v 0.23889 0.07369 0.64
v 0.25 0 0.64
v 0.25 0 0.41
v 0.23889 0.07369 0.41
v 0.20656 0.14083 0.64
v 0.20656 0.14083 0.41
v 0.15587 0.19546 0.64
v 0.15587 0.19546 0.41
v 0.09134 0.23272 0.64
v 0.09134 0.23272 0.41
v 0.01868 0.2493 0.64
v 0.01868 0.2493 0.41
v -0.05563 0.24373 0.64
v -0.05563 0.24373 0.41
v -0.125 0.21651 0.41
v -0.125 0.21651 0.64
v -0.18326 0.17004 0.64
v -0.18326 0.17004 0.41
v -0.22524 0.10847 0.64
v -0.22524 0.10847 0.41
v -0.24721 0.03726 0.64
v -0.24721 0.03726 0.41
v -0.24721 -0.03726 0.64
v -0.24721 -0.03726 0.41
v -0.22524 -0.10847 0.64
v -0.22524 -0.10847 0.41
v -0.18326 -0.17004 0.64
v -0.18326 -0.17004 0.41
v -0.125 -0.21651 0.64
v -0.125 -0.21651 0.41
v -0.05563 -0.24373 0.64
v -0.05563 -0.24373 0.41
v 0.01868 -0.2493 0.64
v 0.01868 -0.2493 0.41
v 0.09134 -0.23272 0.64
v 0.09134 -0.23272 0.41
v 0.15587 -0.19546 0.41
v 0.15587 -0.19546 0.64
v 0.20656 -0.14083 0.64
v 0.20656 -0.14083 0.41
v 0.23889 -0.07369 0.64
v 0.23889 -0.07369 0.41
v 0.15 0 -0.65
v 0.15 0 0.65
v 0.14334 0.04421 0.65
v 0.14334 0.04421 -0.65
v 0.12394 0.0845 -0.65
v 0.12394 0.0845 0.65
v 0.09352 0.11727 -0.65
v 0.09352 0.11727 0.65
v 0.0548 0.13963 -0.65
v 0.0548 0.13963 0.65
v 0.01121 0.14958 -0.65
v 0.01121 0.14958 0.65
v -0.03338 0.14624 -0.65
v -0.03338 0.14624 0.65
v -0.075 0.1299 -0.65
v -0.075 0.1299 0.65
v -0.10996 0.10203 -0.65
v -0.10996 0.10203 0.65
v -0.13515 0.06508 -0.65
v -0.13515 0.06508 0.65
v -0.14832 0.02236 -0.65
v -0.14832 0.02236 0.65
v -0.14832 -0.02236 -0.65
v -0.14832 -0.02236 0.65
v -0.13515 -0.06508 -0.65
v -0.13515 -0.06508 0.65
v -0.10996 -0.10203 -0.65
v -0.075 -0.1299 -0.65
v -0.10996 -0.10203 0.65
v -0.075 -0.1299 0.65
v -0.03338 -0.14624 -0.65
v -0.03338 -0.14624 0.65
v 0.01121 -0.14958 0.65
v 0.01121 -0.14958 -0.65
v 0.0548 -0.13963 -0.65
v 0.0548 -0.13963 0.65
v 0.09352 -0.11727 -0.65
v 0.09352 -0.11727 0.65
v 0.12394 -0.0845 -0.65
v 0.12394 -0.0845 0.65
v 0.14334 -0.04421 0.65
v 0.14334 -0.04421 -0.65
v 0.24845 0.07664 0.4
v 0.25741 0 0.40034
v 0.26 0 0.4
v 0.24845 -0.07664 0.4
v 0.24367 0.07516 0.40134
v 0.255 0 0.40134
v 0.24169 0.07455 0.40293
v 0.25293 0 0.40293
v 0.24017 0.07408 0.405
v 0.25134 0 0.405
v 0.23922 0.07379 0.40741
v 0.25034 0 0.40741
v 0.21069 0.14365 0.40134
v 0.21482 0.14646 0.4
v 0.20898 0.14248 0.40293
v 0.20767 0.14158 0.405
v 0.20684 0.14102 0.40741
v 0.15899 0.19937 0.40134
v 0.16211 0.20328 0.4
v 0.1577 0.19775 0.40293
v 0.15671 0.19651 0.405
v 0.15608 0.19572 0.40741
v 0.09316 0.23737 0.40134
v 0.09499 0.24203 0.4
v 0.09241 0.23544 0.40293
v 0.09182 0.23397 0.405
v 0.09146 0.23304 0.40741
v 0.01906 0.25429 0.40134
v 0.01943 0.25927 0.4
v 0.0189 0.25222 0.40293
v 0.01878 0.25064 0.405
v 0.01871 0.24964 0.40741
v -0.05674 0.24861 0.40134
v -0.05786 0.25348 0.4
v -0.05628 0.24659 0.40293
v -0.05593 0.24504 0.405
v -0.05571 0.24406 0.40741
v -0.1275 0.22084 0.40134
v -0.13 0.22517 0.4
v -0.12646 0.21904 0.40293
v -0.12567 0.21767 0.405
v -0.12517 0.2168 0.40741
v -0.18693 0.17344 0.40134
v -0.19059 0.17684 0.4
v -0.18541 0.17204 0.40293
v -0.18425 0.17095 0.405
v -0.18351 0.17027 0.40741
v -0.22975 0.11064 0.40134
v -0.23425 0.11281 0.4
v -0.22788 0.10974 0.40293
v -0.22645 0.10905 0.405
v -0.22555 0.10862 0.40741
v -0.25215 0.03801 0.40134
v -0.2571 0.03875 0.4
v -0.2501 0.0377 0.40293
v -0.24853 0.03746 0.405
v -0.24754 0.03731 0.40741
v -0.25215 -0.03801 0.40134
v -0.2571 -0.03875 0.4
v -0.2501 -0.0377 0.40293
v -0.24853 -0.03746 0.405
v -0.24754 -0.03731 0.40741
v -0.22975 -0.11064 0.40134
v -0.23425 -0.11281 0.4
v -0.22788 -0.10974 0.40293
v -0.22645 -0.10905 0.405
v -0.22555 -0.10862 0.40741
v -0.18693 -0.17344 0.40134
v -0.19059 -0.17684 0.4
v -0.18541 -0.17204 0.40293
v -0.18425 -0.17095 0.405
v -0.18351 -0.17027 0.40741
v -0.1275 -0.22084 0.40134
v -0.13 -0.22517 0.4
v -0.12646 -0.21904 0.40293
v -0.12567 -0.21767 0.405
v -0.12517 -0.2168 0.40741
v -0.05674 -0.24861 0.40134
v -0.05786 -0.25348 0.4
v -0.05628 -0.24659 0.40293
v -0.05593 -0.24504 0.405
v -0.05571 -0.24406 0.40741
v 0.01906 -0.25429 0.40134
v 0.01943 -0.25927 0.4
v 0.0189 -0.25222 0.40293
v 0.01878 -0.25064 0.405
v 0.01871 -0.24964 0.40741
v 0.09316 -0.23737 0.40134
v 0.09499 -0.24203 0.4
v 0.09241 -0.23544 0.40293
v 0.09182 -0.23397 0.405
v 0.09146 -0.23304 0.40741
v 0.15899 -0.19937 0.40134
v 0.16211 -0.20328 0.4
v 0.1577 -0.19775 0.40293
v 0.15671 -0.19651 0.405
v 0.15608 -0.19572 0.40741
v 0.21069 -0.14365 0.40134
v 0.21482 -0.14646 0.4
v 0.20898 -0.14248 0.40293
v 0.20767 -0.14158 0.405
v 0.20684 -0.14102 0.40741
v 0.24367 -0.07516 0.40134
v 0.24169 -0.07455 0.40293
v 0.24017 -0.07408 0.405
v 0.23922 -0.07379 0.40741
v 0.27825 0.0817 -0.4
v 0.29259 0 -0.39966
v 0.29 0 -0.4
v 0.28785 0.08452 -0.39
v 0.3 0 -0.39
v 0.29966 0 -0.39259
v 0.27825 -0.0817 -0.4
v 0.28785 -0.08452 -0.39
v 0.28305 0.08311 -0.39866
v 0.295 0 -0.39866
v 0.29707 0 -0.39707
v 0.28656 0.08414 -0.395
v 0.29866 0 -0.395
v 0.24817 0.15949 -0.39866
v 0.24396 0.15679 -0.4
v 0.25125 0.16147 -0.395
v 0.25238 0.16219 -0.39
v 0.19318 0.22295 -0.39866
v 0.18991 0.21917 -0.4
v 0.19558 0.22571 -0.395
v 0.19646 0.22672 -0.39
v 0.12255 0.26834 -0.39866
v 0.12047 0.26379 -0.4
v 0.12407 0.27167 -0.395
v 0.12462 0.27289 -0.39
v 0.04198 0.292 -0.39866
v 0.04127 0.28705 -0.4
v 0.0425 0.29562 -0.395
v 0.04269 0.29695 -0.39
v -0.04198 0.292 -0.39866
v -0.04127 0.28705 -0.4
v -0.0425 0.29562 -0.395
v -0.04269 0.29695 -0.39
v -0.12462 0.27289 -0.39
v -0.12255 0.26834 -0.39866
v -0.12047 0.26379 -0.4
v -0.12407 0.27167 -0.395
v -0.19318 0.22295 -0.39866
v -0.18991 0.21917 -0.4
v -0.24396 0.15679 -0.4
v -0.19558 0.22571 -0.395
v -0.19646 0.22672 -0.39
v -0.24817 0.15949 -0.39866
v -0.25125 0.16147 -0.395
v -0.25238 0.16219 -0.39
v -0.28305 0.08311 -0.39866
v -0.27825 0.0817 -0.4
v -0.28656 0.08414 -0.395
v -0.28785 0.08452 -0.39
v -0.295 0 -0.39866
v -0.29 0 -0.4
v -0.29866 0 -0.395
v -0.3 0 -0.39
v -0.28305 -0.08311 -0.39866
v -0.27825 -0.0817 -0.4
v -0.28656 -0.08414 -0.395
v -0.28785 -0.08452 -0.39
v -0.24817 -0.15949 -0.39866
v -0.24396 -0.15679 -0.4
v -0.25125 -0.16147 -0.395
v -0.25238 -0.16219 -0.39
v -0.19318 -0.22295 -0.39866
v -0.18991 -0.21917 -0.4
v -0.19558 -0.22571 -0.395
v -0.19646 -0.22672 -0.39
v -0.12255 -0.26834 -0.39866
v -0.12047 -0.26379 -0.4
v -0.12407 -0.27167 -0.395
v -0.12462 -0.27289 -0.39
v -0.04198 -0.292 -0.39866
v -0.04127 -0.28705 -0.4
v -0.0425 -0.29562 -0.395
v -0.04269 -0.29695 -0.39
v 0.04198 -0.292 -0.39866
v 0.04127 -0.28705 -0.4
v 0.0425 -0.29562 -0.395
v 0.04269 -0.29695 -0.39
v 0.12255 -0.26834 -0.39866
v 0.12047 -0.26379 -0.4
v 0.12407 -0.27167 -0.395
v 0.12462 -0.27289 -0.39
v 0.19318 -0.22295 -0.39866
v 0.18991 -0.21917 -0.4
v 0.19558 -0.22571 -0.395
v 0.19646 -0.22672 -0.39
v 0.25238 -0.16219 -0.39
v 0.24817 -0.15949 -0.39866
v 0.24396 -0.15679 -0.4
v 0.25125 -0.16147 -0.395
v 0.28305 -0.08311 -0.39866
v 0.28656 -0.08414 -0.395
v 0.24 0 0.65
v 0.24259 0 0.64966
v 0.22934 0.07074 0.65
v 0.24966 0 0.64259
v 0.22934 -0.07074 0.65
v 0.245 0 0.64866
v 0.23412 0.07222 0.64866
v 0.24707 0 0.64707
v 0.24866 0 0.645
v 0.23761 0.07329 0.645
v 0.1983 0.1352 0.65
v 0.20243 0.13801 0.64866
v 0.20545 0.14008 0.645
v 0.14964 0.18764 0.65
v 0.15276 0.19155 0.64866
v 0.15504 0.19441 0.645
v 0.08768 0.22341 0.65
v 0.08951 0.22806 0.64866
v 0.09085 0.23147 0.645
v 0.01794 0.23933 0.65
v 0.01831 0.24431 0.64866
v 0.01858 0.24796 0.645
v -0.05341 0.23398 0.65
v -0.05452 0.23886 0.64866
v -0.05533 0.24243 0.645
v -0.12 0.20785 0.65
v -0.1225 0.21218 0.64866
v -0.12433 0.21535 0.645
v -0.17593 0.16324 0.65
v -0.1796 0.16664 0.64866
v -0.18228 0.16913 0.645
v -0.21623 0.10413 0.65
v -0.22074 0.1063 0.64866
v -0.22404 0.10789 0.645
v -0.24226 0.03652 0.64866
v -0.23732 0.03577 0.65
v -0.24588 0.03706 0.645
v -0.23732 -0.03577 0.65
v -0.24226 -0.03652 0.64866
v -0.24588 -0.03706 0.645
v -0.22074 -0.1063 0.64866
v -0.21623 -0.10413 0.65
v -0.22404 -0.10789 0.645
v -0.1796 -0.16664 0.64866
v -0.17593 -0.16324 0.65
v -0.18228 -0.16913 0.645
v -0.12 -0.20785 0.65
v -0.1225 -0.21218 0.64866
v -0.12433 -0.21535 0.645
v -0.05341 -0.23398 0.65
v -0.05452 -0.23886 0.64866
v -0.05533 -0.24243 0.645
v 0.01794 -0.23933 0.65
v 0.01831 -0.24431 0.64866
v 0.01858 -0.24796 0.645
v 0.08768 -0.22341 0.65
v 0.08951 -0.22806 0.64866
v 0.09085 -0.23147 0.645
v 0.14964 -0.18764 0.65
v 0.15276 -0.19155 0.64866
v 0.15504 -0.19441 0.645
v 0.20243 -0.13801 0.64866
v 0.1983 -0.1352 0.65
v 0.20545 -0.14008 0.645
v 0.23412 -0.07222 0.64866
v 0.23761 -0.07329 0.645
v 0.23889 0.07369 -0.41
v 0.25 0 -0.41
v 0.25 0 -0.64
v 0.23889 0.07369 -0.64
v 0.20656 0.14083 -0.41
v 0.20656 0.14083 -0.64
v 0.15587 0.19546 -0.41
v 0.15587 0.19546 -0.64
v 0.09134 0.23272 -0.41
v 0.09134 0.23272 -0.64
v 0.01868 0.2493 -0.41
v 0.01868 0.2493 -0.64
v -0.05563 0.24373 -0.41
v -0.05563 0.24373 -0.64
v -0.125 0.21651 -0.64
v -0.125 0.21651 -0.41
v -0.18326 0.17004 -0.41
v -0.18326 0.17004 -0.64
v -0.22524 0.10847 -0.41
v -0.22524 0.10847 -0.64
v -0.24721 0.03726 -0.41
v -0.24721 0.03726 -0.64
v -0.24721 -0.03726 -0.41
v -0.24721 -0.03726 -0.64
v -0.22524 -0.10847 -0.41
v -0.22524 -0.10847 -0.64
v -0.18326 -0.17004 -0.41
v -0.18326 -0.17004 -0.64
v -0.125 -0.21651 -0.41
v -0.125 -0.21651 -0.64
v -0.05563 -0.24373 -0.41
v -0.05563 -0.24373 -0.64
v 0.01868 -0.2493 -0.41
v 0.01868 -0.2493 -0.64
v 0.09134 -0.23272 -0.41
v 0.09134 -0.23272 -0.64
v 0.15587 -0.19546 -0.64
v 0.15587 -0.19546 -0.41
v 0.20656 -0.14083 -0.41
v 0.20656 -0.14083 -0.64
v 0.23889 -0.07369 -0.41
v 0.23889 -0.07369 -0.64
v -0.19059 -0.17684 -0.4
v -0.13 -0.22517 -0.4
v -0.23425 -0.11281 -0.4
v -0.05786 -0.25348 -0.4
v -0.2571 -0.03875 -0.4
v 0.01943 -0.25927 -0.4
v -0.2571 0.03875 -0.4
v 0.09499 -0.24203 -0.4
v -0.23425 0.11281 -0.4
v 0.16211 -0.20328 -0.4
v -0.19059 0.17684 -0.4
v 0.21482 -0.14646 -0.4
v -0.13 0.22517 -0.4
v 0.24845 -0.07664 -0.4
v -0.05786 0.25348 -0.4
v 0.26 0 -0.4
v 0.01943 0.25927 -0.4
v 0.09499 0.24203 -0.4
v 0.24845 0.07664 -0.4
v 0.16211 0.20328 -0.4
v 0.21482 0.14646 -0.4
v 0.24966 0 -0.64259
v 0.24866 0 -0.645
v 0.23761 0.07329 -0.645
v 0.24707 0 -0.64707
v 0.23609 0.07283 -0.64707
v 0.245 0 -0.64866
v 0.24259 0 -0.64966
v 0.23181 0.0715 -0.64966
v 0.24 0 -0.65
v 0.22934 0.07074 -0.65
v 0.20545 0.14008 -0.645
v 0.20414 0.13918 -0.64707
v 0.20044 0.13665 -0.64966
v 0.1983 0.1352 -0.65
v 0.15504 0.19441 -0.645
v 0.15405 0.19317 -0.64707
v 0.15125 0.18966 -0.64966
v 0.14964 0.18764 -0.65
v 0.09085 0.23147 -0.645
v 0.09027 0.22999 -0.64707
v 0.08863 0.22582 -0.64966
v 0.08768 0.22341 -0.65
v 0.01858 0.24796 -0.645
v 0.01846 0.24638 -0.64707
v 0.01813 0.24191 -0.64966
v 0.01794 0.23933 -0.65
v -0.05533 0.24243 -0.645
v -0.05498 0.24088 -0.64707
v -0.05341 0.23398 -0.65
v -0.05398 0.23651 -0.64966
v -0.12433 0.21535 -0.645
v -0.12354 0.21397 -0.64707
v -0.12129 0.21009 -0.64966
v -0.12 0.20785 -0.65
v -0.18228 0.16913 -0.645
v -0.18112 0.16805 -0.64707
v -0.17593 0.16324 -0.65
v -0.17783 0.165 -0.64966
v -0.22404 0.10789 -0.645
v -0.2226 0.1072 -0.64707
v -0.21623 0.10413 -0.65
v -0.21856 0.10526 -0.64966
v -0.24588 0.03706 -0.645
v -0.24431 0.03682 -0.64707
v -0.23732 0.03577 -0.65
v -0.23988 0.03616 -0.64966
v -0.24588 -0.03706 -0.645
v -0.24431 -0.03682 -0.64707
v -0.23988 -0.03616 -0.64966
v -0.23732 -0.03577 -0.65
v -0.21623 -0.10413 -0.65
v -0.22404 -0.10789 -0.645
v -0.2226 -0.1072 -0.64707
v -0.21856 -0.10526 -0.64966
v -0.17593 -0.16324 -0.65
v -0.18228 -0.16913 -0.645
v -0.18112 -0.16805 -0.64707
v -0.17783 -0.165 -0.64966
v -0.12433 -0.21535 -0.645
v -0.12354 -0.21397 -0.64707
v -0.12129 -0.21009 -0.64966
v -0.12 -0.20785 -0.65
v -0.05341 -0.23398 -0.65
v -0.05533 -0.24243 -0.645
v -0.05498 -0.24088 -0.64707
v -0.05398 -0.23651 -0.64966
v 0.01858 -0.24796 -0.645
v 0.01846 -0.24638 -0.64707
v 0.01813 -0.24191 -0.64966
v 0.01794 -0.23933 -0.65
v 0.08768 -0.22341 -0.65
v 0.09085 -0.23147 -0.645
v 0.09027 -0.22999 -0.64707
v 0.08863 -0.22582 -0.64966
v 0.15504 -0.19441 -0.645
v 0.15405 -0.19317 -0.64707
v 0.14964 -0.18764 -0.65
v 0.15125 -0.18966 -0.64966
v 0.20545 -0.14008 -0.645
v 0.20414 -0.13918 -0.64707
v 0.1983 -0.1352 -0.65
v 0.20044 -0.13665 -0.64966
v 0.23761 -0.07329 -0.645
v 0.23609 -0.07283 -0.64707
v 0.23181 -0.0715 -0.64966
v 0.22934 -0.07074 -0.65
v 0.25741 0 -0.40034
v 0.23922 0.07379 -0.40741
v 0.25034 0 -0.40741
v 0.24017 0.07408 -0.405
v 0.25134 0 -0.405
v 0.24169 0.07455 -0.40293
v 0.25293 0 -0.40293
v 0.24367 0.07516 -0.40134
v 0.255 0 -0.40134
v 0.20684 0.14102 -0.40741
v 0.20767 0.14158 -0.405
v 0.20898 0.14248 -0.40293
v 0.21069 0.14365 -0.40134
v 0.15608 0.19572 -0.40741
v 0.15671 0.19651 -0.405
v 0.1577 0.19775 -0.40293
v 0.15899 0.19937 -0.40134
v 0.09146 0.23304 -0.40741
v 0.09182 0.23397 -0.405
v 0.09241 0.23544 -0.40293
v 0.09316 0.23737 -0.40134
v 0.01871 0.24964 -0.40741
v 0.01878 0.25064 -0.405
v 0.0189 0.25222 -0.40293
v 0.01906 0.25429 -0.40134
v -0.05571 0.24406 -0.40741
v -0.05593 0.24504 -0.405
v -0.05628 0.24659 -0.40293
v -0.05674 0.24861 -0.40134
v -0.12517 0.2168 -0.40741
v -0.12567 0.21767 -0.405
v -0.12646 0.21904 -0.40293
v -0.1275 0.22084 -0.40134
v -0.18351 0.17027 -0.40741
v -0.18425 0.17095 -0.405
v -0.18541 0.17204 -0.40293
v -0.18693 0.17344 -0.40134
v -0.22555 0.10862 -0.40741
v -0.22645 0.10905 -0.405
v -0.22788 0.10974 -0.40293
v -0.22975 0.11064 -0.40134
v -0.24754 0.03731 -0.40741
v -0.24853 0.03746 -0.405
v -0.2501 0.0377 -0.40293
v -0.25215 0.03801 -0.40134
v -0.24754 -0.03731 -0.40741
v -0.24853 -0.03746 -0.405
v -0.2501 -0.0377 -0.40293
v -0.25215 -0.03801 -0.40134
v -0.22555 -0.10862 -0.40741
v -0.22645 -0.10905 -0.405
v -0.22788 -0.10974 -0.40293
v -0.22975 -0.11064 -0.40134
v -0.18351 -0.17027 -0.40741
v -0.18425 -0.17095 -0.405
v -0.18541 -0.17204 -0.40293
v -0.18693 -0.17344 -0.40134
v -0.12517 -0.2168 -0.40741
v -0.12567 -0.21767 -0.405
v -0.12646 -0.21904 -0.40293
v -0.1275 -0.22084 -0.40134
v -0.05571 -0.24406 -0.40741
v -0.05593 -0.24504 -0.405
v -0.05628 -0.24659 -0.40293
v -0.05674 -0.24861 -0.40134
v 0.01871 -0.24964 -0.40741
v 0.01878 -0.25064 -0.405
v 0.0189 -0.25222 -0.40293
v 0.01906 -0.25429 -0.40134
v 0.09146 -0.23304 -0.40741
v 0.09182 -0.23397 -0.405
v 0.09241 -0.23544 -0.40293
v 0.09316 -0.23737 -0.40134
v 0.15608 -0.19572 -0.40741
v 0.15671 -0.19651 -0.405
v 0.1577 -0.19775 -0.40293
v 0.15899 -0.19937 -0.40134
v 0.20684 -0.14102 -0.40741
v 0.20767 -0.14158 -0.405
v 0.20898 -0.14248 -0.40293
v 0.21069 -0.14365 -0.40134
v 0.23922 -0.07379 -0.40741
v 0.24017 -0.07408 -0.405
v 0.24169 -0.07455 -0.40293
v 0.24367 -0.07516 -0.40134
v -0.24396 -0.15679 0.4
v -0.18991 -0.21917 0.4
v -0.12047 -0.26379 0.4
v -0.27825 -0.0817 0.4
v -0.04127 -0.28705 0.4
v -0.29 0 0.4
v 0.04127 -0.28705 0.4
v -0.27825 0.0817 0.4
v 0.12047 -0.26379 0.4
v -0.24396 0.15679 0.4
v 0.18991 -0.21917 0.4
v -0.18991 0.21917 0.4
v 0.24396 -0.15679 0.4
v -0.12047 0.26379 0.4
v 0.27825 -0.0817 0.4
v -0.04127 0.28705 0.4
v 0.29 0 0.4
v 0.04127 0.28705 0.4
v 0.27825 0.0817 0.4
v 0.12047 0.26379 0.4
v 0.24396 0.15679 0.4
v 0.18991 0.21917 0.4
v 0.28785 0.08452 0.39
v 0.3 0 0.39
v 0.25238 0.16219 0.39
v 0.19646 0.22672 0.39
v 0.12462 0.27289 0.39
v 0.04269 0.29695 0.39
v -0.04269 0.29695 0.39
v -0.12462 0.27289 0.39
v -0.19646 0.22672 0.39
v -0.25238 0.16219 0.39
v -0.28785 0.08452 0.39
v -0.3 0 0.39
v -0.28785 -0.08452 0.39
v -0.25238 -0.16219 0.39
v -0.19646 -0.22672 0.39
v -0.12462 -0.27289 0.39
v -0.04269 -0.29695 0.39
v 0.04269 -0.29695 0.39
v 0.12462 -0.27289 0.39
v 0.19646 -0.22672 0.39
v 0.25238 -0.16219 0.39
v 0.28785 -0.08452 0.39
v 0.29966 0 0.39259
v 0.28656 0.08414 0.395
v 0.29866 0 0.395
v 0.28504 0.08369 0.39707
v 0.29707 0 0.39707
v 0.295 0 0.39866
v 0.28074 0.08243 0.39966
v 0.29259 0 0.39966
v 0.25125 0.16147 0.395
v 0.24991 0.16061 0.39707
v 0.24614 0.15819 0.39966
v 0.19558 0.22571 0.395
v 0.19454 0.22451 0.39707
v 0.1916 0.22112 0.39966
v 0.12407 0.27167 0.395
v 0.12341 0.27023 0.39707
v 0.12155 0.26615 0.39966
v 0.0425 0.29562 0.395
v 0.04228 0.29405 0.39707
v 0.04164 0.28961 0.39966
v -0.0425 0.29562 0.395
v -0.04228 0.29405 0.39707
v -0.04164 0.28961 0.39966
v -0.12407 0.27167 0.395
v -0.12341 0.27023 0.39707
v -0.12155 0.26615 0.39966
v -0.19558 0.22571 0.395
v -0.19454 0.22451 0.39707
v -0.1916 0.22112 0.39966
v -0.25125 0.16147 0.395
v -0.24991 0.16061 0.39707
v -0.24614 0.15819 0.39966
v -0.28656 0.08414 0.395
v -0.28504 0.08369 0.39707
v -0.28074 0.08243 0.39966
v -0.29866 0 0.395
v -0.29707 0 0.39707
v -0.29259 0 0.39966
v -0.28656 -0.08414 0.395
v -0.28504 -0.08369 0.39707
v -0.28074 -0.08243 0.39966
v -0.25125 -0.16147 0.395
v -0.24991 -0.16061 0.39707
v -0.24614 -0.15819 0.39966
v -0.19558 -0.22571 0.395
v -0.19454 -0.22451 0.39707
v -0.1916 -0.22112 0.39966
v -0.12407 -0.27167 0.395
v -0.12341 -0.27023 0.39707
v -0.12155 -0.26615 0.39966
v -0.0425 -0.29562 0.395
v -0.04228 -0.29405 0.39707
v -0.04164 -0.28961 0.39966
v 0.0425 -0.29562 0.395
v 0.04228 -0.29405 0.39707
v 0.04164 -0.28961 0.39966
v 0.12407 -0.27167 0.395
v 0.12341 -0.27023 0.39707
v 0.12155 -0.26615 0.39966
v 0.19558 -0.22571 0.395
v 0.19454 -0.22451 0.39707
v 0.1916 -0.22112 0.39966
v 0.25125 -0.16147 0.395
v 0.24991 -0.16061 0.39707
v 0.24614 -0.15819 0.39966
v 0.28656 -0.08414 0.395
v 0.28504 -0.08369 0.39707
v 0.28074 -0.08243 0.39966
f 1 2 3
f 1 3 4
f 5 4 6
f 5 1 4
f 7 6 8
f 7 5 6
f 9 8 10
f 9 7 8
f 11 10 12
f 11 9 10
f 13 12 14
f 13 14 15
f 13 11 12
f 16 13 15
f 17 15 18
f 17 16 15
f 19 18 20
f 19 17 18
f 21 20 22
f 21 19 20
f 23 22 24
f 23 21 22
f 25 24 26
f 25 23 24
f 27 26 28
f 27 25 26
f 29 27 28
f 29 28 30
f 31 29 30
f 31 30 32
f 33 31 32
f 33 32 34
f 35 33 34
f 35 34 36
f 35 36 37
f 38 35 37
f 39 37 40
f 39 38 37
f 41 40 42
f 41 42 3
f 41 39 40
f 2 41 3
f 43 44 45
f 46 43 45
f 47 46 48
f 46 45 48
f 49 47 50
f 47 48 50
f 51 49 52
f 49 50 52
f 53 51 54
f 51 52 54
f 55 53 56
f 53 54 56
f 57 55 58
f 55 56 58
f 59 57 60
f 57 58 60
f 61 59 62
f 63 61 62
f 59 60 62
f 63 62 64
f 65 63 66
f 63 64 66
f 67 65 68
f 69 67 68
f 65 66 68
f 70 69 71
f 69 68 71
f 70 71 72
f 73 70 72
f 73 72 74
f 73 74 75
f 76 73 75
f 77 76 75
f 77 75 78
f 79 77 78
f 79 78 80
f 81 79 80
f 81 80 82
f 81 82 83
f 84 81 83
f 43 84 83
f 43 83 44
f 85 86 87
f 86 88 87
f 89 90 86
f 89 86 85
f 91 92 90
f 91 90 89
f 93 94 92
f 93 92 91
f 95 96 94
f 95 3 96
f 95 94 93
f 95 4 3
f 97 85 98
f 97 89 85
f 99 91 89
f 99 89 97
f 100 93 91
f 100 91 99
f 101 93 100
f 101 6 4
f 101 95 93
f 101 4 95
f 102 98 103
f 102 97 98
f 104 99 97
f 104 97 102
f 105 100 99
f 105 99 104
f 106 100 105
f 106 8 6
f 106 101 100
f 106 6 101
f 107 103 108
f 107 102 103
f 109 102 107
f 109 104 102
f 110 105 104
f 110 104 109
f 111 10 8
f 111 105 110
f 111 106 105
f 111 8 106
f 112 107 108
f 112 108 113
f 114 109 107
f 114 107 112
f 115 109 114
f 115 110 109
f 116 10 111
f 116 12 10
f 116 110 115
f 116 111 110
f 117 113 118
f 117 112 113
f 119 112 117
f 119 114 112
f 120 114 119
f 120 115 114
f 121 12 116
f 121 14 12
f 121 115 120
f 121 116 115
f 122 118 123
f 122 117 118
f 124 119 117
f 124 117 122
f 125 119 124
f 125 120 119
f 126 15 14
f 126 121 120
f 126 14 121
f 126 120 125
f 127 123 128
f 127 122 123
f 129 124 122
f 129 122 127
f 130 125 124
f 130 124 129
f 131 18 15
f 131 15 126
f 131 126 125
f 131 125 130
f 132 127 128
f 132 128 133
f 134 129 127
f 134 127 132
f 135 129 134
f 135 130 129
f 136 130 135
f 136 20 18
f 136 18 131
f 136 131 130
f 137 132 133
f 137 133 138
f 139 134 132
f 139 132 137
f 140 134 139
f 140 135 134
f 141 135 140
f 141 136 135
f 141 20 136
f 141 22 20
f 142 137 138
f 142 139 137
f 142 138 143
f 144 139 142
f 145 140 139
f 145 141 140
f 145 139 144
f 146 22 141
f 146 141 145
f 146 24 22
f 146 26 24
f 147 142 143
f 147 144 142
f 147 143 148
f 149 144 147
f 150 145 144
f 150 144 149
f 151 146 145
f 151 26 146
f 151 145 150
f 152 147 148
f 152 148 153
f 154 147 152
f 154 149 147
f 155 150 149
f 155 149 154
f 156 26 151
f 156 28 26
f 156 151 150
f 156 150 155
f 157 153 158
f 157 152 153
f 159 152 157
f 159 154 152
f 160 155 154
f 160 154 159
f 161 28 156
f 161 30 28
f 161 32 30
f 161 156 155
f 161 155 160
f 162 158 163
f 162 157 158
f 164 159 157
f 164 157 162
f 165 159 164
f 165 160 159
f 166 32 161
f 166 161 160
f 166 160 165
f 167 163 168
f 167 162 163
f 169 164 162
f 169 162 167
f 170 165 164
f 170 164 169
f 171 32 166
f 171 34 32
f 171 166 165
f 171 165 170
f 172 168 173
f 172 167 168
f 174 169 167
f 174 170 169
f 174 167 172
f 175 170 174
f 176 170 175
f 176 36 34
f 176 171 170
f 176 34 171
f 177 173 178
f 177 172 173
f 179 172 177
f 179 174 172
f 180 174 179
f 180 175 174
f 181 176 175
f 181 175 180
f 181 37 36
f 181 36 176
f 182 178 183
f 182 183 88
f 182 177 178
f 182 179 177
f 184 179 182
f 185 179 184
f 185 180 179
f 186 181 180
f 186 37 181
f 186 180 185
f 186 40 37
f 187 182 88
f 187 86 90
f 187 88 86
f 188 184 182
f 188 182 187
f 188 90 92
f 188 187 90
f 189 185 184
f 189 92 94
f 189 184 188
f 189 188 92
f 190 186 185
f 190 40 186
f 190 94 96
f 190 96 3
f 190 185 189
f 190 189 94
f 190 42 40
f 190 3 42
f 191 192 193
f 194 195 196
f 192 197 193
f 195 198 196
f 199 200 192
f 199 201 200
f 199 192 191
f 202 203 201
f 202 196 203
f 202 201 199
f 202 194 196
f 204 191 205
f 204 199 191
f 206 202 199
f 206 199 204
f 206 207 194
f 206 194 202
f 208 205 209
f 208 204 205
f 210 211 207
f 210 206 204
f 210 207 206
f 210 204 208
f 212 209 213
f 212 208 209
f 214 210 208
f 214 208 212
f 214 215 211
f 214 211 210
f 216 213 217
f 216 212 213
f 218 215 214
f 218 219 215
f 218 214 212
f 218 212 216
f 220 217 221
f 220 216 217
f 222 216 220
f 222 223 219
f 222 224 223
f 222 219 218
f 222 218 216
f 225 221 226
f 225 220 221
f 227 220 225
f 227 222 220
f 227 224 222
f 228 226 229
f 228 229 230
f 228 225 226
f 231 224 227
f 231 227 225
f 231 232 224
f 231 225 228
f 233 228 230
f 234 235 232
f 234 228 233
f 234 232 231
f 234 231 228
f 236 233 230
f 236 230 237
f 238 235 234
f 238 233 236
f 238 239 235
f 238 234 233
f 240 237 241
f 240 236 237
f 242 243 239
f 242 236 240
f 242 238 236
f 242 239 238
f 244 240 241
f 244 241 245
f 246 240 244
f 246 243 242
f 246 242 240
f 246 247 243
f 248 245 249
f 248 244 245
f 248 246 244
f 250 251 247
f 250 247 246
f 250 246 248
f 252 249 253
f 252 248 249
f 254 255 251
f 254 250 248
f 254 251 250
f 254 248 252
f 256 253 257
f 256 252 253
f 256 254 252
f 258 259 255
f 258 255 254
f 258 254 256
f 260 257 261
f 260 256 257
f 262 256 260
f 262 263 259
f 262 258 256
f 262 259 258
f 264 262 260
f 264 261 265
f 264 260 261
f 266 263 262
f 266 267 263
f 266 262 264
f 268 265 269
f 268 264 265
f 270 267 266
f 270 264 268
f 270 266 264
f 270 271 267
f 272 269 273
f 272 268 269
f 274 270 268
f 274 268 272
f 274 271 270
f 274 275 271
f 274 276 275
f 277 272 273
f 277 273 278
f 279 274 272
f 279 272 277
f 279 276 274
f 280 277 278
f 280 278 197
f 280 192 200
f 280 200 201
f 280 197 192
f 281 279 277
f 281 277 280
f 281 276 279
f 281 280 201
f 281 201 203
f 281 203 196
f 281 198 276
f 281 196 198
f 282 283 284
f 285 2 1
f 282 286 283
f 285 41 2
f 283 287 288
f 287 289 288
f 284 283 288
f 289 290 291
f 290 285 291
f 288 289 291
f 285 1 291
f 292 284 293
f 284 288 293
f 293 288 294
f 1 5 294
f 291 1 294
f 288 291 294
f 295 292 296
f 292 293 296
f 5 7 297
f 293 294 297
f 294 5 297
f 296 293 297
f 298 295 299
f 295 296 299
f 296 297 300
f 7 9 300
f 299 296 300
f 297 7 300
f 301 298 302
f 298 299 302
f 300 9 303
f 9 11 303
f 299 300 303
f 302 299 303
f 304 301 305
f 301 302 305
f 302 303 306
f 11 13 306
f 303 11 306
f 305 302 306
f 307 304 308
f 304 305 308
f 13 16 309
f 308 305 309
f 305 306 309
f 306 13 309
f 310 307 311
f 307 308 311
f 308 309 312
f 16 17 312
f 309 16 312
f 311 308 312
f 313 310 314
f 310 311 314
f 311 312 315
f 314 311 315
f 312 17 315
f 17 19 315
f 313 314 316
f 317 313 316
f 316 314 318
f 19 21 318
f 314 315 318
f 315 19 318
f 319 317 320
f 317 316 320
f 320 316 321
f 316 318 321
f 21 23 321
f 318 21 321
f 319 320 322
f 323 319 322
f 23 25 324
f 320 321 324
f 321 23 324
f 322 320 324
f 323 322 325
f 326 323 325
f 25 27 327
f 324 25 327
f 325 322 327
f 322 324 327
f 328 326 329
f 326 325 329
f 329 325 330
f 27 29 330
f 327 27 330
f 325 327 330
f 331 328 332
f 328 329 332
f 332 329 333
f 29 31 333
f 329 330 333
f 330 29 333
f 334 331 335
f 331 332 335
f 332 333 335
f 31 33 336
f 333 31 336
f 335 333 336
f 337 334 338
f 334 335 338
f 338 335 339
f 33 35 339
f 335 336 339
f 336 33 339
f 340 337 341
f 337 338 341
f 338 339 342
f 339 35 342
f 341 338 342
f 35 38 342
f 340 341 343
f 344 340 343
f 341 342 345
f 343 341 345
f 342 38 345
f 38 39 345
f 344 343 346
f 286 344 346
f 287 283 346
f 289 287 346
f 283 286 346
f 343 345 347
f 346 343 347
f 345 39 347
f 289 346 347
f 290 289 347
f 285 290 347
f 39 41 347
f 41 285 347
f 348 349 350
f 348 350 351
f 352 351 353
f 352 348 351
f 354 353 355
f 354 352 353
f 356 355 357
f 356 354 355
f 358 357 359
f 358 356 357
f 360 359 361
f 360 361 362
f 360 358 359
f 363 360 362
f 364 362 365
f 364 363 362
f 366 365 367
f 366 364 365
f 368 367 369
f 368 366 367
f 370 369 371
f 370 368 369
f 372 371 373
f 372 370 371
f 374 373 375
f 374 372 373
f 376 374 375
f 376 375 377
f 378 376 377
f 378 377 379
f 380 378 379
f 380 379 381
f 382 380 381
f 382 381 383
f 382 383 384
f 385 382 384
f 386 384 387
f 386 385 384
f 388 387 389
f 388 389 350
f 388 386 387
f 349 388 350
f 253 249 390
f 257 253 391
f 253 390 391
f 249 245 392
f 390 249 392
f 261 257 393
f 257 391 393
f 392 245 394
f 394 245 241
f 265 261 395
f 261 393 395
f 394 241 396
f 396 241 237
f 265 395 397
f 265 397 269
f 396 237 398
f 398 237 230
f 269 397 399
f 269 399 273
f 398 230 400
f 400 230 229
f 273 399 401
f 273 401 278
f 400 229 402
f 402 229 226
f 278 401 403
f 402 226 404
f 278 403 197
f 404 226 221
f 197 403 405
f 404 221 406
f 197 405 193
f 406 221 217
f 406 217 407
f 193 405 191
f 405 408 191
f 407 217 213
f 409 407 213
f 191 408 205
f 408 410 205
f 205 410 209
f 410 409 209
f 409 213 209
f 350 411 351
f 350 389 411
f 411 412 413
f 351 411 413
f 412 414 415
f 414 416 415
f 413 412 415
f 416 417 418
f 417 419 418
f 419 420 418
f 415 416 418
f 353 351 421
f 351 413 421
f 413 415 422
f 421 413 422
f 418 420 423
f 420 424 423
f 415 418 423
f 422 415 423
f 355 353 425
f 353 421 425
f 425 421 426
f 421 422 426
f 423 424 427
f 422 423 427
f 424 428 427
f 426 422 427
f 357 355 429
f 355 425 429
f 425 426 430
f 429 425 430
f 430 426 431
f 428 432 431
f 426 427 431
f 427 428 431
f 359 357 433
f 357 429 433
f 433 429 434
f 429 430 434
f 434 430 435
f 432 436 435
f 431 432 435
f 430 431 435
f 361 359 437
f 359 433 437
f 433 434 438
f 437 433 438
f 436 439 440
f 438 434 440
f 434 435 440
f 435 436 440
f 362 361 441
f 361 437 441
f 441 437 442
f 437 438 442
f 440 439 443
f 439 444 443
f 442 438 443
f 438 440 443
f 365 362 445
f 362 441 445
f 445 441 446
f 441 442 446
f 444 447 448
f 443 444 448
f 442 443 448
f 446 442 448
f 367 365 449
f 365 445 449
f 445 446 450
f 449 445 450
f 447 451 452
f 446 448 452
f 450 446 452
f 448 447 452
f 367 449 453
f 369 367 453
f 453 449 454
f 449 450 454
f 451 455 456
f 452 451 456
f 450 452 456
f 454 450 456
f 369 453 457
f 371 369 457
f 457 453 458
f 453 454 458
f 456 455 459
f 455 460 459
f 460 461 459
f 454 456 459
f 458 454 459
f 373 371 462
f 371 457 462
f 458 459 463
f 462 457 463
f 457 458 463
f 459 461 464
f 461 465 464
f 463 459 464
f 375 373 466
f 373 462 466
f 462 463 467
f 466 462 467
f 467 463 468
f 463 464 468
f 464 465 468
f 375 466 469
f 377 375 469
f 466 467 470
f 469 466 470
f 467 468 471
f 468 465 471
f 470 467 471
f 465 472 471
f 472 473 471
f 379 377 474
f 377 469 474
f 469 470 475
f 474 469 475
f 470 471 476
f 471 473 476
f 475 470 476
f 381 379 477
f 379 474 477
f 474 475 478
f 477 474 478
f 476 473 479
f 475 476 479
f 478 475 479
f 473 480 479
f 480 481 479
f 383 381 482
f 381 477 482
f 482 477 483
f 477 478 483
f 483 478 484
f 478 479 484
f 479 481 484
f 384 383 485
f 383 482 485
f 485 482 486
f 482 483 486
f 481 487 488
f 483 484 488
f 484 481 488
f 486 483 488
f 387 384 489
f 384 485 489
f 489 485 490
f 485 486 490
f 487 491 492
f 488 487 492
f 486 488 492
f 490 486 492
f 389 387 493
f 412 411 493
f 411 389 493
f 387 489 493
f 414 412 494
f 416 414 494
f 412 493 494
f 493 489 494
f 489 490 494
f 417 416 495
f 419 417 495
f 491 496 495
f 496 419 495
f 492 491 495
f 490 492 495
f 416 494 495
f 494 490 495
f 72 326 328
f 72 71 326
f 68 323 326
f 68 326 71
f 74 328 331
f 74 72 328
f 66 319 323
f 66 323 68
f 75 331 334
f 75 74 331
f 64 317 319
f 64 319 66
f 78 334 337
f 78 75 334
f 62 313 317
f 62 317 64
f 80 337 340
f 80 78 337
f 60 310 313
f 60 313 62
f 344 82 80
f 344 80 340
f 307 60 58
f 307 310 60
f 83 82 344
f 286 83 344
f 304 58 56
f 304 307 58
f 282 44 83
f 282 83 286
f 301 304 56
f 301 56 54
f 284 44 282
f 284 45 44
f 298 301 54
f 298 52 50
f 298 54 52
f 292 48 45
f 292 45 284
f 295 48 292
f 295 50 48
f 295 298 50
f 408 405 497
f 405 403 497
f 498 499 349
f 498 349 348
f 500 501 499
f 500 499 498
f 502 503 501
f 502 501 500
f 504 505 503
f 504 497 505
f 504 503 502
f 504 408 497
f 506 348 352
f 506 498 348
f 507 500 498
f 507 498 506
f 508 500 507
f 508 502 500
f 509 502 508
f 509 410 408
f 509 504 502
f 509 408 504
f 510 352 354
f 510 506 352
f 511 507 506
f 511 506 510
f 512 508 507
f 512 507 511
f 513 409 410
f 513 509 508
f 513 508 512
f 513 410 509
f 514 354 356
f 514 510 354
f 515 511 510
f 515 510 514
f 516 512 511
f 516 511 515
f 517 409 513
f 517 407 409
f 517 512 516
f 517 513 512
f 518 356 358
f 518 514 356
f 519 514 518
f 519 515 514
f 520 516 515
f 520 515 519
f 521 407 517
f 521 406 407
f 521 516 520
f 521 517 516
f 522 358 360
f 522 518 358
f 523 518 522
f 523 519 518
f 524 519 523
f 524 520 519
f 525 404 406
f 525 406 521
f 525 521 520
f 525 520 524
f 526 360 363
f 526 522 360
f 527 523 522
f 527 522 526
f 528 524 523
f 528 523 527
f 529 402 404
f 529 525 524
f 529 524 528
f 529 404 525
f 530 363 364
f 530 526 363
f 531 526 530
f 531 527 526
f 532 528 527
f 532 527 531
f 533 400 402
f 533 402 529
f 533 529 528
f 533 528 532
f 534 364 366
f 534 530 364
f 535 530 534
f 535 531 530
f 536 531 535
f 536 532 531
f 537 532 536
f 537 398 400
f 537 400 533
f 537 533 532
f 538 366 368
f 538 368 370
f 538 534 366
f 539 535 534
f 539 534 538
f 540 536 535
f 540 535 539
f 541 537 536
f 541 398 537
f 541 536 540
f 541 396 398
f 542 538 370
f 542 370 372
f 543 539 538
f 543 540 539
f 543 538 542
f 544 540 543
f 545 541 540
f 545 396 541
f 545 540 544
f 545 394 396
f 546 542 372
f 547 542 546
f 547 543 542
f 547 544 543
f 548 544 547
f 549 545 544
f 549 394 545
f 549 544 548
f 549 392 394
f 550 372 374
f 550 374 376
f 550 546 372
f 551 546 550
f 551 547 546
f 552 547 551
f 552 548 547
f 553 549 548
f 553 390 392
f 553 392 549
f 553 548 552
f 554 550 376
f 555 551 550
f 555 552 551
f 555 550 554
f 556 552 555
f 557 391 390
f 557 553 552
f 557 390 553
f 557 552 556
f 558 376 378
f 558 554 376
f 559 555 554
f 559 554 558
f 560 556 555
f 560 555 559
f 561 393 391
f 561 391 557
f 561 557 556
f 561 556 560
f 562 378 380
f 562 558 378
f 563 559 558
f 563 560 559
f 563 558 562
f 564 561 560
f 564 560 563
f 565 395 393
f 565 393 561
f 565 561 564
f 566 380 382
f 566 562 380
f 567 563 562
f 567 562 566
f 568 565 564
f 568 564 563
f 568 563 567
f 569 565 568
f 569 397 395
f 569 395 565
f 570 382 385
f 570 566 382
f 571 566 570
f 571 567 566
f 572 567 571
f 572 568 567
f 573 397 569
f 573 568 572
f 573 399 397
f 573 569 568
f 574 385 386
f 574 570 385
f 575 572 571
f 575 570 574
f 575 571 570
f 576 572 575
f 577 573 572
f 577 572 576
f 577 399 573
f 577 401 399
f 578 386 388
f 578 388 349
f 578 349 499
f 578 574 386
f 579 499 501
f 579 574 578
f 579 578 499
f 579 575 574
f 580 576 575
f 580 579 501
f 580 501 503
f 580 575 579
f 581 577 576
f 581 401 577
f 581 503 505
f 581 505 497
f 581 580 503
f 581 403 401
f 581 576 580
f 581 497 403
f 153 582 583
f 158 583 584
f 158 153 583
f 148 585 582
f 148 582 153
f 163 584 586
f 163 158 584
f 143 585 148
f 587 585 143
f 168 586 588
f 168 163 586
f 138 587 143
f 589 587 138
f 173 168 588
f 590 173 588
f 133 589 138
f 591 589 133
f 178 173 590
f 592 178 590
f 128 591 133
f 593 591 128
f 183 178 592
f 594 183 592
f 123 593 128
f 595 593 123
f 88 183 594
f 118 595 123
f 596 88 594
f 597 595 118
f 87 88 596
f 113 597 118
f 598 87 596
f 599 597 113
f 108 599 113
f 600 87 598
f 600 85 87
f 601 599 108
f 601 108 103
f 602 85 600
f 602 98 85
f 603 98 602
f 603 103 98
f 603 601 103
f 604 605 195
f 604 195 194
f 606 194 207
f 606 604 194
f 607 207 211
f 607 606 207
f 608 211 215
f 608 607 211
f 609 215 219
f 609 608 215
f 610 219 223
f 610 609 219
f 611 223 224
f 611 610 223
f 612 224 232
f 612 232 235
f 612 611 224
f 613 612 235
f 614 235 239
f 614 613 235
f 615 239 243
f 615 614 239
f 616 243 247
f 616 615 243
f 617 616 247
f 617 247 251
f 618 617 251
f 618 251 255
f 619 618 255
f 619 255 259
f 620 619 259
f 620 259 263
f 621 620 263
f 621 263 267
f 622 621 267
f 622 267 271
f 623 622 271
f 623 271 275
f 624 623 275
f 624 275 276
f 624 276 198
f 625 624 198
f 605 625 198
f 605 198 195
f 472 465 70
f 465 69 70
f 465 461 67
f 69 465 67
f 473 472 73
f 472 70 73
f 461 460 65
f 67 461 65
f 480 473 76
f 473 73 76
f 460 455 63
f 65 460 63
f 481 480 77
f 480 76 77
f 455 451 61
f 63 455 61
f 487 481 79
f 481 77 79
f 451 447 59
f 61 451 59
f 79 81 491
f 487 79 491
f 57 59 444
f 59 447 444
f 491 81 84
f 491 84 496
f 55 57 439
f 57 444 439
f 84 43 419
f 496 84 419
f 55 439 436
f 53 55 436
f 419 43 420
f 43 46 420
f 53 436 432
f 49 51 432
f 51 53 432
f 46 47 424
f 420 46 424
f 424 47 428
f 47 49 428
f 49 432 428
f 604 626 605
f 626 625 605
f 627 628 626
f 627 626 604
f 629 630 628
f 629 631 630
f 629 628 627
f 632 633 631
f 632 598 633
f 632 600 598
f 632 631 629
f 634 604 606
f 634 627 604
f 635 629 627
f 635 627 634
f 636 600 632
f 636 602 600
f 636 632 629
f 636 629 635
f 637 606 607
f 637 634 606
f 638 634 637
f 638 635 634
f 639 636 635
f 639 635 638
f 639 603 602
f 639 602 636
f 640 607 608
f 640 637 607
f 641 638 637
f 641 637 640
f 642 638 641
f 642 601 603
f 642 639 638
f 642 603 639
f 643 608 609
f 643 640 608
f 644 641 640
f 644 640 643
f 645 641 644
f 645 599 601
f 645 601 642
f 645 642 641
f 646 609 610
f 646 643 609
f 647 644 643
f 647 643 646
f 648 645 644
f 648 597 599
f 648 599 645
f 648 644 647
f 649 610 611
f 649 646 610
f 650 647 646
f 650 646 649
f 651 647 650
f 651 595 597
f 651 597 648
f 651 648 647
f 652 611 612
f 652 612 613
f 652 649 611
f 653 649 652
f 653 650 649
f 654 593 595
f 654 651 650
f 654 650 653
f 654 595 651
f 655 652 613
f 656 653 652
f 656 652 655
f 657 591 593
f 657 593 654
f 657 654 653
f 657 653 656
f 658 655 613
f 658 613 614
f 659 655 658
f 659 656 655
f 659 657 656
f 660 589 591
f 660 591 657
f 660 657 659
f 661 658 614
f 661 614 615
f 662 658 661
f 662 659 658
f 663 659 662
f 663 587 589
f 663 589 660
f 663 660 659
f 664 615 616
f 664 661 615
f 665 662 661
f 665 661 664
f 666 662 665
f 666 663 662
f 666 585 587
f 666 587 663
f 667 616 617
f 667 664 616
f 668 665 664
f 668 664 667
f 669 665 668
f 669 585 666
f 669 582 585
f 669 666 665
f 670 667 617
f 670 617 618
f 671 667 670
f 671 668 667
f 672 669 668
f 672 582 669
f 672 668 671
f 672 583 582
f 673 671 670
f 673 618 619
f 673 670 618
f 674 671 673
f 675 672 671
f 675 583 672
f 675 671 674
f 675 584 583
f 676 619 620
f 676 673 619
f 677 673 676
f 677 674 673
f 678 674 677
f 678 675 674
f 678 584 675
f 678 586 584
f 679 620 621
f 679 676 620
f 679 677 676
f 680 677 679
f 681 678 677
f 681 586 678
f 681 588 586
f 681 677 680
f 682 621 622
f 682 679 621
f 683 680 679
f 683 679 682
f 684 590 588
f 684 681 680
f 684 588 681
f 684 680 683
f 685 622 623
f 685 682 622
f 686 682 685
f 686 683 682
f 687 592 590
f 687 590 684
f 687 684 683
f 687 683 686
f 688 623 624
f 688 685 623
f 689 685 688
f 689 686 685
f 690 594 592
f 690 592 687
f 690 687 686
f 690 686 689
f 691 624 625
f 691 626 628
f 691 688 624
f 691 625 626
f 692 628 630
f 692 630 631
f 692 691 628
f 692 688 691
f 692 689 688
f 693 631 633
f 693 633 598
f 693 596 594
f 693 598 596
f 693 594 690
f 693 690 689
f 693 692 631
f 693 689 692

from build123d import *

# Parameters (mm, degrees)
SKETCH1_R           = 0.3
BOSS_EXTRUDE1_DEPTH = 0.4
SKETCH4_R           = 0.25
BOSS_EXTRUDE3_DEPTH = 0.65
SKETCH5_R           = 0.15
CUT_EXTRUDE1_DEPTH  = 2.367479433
FILLET1_R           = 0.01
FILLET2_R           = 0.01


with BuildPart() as part:
    # Sketch1 → Boss-Extrude1 (new, symmetric)
    with BuildSketch(Plane.XY):
        Circle(SKETCH1_R)
    extrude(amount=BOSS_EXTRUDE1_DEPTH, both=True)

    # Sketch4 → Boss-Extrude3 (add, symmetric)
    with BuildSketch(Plane.XY):
        Circle(SKETCH4_R)
    extrude(amount=BOSS_EXTRUDE3_DEPTH, both=True)

    # Sketch5 → Cut-Extrude1 (cut, through all)
    with BuildSketch(Plane.XY.offset(0.65)):
        Circle(SKETCH5_R)
    extrude(amount=-CUT_EXTRUDE1_DEPTH, mode=Mode.SUBTRACT)

    # Fillet1
    fillet1_edges = [part.edges().sort_by_distance(p)[0] for p in [
        (-0.3, 0, -0.4),
        (-0.3, 0, 0.4),
        (-0.25, 0, -0.65),
        (-0.25, 0, 0.65),
    ]]
    fillet(fillet1_edges, radius=FILLET1_R)

    # Fillet2
    fillet2_edges = [part.edges().sort_by_distance(p)[0] for p in [
        (-0.25, 0, -0.4),
        (-0.25, 0, 0.4),
    ]]
    fillet(fillet2_edges, radius=FILLET2_R)


solid = part.part
